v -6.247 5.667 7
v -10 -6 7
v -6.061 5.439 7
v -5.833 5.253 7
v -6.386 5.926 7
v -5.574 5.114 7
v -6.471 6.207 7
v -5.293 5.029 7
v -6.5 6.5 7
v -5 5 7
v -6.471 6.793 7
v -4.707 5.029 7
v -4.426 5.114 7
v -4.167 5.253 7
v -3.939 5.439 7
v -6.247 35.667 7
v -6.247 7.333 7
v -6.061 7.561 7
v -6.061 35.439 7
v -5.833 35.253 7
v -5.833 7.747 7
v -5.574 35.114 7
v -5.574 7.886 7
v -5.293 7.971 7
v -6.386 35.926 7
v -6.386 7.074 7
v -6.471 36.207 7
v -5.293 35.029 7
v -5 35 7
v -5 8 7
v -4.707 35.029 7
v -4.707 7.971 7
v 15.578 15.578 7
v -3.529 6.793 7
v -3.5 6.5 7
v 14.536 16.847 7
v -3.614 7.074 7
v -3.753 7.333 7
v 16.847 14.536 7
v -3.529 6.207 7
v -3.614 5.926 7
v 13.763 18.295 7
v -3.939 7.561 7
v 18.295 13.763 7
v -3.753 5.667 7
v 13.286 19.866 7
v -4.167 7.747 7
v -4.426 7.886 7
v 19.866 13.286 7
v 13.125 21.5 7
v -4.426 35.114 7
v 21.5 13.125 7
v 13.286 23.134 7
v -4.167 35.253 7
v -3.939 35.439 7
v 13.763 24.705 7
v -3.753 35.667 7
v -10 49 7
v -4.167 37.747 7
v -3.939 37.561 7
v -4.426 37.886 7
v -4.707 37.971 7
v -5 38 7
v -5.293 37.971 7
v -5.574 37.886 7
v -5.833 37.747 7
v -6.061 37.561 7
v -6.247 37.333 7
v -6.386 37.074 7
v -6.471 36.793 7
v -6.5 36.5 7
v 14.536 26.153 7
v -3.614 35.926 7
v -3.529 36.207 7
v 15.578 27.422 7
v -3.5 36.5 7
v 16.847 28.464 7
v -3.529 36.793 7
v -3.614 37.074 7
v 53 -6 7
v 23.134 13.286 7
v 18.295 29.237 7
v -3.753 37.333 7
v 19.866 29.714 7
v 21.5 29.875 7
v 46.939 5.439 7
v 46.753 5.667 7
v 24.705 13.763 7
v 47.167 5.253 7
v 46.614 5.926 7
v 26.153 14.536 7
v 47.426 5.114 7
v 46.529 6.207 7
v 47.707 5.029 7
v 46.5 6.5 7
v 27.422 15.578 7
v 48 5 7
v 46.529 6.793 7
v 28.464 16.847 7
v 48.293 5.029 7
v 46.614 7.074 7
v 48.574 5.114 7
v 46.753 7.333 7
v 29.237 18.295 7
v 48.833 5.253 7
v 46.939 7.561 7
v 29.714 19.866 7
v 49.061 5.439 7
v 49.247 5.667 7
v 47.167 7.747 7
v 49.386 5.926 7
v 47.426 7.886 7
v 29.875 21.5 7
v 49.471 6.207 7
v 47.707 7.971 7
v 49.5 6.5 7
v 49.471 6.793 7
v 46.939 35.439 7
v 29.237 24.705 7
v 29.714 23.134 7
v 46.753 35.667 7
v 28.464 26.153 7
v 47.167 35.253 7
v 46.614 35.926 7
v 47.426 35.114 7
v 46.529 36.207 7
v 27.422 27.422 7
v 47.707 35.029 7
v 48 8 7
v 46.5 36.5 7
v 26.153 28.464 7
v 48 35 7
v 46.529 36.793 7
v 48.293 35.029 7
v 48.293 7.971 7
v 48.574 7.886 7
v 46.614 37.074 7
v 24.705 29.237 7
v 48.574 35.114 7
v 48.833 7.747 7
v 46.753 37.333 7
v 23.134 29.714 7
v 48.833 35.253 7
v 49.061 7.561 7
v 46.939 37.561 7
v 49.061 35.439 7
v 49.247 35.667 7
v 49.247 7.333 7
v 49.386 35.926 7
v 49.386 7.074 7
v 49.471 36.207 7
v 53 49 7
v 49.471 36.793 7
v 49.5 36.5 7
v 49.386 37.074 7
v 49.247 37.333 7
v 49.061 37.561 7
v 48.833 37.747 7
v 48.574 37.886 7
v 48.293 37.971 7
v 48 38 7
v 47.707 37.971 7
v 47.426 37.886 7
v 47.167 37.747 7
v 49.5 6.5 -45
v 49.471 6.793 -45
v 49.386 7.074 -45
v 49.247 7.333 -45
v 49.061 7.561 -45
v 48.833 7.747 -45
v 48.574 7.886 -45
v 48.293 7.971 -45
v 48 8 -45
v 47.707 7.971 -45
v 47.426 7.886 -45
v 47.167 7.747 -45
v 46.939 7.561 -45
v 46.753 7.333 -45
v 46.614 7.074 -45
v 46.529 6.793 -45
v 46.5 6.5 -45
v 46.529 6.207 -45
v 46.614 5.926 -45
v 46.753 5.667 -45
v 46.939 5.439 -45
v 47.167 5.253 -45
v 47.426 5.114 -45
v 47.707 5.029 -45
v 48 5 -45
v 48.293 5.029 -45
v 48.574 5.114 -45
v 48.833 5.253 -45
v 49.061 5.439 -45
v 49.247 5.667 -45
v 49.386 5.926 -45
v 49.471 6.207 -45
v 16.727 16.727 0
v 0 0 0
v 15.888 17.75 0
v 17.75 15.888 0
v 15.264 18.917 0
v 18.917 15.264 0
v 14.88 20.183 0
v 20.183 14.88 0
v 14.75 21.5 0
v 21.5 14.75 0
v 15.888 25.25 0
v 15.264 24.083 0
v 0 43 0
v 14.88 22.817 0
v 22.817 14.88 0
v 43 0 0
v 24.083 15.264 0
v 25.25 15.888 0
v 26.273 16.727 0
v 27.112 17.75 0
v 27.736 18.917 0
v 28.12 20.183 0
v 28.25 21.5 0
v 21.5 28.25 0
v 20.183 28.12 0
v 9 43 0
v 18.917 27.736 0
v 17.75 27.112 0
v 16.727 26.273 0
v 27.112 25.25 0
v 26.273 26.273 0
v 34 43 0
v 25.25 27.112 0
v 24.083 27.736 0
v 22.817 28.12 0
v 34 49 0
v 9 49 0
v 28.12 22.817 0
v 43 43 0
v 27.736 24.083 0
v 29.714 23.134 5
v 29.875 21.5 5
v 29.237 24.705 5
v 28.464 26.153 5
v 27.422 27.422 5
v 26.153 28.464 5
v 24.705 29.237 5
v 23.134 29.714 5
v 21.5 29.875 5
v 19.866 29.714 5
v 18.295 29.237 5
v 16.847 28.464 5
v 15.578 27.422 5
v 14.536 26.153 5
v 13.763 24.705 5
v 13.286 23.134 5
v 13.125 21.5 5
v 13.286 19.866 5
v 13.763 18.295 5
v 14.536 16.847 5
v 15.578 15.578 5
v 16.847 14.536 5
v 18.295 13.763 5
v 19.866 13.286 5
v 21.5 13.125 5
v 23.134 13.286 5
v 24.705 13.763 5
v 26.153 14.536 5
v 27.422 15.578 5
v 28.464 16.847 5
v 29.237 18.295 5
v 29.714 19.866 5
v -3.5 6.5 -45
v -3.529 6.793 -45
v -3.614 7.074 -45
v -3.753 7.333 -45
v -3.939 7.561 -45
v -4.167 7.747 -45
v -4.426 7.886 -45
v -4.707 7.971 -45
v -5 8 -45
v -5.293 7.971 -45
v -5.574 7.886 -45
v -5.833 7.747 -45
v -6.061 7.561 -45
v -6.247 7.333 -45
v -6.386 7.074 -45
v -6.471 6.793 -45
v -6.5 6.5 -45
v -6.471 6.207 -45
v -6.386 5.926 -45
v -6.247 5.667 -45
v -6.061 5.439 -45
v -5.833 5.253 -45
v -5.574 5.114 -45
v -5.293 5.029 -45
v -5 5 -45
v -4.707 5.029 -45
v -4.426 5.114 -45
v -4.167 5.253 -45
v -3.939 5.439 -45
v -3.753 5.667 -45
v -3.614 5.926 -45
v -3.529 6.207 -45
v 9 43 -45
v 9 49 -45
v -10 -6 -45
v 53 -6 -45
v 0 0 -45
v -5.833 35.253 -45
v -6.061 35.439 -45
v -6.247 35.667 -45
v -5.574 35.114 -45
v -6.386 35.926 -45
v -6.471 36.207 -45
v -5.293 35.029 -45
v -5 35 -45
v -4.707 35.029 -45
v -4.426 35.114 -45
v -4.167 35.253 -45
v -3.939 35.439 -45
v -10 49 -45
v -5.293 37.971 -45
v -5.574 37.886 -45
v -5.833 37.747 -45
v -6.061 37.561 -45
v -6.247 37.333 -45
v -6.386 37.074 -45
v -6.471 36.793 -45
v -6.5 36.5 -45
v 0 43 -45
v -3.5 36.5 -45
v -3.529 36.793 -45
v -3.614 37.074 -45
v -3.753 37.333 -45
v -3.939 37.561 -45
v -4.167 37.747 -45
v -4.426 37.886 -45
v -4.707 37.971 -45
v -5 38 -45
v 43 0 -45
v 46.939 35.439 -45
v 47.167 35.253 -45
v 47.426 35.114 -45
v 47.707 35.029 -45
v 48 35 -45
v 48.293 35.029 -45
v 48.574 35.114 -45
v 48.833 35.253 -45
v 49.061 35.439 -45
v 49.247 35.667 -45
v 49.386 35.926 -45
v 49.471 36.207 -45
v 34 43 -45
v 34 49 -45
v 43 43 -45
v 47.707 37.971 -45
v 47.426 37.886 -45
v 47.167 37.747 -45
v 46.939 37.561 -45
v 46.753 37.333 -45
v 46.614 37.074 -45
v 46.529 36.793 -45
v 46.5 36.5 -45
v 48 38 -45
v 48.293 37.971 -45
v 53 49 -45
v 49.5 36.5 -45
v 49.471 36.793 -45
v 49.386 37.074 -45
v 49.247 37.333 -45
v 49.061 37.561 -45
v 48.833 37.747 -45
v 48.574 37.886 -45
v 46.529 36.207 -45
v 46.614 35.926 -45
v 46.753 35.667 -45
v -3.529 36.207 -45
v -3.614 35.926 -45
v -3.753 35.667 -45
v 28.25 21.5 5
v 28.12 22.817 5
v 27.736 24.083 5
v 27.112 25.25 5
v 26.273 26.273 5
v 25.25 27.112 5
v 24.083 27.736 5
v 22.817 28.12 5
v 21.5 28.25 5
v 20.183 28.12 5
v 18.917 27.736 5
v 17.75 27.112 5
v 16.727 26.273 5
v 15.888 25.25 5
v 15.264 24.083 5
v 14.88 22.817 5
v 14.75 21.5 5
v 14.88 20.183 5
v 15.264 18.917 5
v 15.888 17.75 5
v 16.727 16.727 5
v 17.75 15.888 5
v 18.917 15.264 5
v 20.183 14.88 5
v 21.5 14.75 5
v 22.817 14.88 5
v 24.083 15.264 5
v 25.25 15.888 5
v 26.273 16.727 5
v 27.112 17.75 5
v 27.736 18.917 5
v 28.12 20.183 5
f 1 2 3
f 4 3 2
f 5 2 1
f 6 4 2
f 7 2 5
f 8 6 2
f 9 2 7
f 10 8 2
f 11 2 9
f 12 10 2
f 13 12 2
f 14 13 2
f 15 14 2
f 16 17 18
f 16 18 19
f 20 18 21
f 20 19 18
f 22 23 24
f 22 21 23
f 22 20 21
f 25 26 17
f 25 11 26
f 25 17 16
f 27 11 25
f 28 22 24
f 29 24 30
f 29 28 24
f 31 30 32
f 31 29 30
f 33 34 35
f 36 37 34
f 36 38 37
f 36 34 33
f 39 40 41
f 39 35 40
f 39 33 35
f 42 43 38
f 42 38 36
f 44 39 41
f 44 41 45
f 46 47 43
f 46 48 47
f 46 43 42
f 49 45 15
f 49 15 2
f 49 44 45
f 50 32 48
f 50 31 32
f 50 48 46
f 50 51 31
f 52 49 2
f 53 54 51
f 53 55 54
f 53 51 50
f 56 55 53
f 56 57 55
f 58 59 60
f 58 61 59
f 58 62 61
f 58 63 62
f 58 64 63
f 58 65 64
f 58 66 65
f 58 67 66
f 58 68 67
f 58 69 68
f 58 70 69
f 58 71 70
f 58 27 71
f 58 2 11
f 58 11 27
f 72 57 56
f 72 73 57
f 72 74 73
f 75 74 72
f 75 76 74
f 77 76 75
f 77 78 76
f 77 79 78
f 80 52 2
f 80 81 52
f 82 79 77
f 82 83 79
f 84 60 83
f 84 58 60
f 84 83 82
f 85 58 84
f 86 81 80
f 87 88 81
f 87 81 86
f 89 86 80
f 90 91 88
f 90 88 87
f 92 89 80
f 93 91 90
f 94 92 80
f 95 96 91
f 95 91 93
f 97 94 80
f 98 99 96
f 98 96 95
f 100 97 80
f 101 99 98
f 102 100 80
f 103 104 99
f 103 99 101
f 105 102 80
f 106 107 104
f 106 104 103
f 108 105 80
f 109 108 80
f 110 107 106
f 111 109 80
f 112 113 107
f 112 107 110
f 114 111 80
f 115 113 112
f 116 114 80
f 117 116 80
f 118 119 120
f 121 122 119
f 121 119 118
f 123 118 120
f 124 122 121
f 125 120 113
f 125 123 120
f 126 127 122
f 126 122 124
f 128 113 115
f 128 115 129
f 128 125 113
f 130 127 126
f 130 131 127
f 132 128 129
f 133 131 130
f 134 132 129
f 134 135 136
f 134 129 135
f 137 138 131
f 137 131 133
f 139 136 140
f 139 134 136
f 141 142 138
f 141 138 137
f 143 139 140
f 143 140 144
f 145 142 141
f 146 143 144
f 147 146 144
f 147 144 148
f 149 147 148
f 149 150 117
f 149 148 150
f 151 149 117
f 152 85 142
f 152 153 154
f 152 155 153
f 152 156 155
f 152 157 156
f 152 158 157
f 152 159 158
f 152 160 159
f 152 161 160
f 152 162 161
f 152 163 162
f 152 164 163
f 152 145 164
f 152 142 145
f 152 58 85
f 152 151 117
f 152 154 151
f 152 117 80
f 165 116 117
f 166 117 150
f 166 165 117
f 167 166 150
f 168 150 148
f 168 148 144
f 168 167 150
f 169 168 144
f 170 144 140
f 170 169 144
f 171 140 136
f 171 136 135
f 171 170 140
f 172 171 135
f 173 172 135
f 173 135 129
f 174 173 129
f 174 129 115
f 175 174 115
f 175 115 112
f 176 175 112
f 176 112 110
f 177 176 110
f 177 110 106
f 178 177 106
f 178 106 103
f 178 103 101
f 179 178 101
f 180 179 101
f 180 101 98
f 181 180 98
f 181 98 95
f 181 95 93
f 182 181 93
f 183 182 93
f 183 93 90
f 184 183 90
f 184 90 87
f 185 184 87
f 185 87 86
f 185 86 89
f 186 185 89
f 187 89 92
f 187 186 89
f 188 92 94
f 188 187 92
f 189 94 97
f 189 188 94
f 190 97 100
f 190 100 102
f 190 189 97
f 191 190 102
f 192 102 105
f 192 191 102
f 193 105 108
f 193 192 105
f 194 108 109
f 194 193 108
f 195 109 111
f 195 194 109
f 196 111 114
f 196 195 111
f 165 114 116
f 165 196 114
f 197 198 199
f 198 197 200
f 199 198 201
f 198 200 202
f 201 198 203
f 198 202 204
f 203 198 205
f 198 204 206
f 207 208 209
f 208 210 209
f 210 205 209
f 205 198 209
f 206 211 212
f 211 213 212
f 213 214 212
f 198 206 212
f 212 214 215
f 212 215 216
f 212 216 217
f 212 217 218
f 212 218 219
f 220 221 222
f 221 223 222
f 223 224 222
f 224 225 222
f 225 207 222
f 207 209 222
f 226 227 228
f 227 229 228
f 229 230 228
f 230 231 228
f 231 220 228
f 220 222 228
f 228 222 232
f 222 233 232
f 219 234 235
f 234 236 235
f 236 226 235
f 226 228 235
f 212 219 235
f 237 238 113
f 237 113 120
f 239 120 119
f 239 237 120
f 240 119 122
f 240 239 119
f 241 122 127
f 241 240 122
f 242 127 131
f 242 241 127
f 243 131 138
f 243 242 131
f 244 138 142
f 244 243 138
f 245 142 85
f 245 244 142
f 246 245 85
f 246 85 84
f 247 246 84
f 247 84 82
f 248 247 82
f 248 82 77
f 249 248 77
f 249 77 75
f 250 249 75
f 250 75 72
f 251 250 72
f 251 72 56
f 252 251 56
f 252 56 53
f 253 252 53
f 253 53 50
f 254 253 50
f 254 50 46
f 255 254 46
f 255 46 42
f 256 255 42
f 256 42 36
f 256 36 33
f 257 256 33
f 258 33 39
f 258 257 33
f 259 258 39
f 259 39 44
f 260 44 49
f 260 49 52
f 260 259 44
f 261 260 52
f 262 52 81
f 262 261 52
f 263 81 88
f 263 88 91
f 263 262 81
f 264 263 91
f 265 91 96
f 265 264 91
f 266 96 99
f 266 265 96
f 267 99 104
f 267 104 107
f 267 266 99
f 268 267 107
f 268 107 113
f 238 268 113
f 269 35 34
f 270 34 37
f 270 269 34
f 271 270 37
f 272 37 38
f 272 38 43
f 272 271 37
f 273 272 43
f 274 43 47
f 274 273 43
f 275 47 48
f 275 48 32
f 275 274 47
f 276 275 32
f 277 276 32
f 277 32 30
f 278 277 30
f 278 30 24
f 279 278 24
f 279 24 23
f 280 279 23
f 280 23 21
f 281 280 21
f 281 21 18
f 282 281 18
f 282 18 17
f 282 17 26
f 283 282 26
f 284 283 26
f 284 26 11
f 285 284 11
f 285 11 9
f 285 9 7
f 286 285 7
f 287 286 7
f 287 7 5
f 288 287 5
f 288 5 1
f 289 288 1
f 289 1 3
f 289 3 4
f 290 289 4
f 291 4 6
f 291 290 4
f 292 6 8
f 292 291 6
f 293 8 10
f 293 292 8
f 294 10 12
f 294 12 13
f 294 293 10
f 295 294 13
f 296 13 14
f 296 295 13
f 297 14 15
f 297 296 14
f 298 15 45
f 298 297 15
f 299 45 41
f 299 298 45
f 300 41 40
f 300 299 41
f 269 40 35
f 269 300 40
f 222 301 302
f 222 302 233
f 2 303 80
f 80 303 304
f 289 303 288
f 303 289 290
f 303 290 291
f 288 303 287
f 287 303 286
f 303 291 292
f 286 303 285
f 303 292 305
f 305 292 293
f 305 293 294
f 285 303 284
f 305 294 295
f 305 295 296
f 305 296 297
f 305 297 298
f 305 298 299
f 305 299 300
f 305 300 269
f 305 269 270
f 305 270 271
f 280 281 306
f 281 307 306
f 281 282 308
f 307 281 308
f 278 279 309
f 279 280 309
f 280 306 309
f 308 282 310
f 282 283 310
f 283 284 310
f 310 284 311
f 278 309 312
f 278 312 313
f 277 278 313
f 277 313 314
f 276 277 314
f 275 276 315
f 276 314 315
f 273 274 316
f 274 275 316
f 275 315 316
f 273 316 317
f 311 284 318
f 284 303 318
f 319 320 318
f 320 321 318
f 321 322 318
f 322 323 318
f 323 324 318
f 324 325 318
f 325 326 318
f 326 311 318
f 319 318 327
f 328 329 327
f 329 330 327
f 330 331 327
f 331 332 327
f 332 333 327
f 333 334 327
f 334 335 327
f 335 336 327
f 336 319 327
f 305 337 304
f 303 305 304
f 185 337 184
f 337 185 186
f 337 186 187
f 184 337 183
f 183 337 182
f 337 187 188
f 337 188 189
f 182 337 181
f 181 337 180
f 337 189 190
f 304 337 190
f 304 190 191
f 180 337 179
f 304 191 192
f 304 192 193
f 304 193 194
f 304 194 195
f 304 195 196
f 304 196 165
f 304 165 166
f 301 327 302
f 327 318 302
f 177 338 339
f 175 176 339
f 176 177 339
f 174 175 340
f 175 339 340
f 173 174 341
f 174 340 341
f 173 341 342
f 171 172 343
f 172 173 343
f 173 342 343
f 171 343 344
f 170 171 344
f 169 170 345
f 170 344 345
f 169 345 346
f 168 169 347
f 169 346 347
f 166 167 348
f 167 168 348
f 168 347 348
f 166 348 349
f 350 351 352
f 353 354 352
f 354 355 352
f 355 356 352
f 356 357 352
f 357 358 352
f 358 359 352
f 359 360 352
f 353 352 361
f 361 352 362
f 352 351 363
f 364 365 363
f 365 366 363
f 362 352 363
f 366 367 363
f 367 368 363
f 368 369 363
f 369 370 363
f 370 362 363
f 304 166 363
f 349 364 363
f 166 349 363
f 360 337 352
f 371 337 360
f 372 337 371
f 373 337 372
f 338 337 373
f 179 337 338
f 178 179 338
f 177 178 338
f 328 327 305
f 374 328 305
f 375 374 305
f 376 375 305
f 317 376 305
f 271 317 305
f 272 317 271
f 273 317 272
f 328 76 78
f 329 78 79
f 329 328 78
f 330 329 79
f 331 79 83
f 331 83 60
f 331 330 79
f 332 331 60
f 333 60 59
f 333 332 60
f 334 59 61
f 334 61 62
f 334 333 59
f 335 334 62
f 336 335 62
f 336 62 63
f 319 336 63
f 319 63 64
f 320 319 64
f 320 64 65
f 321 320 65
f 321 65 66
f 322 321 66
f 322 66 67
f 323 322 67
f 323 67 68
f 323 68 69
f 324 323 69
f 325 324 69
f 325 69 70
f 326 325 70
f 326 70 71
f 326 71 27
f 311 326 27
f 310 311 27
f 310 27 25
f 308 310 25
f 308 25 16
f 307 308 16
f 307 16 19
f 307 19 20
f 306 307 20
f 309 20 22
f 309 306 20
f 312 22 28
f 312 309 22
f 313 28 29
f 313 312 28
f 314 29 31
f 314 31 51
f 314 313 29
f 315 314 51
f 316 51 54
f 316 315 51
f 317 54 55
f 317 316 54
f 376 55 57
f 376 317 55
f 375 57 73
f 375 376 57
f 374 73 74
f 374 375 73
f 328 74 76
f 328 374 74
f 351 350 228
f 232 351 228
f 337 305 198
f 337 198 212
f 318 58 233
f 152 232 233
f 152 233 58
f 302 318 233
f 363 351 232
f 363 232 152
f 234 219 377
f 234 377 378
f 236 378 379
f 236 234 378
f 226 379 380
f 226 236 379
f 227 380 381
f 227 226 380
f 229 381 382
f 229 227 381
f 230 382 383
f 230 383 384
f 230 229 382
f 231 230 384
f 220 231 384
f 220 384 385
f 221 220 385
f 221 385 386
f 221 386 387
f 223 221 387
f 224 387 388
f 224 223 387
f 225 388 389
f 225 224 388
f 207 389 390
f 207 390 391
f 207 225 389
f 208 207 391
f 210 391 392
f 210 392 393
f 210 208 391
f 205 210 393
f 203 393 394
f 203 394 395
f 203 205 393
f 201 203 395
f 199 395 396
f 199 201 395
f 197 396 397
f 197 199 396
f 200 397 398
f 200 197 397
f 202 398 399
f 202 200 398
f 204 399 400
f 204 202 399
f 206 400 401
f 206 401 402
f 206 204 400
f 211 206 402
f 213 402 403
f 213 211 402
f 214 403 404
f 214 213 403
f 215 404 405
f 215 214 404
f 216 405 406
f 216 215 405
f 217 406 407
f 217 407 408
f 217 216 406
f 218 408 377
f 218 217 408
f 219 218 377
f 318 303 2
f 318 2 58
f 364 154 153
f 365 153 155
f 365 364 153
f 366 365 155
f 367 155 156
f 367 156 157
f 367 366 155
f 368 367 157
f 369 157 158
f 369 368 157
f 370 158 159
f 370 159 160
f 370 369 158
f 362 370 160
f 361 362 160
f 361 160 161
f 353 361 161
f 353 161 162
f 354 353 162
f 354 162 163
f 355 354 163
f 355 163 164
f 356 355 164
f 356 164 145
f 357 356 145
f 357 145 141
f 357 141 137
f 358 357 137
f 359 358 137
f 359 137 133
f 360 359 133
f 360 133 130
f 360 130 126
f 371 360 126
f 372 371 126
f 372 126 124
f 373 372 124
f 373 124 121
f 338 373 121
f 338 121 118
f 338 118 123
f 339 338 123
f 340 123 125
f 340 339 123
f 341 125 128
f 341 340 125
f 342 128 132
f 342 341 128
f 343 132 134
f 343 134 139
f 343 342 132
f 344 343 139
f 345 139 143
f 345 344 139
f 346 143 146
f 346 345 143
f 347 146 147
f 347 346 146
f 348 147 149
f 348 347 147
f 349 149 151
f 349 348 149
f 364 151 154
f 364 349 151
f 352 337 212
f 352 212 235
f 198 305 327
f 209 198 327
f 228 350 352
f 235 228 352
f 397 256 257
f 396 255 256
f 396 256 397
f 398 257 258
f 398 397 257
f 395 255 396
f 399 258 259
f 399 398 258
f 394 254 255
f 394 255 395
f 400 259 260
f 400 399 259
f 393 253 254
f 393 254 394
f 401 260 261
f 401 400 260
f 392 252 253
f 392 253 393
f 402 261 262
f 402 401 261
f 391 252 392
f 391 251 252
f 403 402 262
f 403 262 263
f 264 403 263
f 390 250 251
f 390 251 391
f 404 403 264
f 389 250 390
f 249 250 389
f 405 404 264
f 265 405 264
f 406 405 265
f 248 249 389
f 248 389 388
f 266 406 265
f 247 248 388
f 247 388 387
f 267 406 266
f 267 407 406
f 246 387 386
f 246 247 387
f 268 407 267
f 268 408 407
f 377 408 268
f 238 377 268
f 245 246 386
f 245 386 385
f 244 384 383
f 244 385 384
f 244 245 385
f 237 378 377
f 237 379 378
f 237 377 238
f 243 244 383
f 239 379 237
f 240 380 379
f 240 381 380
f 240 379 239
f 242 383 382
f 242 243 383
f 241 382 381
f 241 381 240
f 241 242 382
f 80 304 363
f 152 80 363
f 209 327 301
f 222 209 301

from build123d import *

# Parameters (mm, degrees)
SKETCH1_7_W         = 63
SKETCH1_7_H         = 55
SKETCH1_7_R         = 1.5
SKETCH1_7_R_2       = 8.375
BOSS_EXTRUDE3_DEPTH = 7
BOSS_EXTRUDE4_START = -45
SKETCH1_8_W         = 63
SKETCH1_8_H         = 55
SKETCH1_8_R         = 1.5
SKETCH1_8_W_2       = 43
SKETCH1_8_H_2       = 43
BOSS_EXTRUDE4_DEPTH = 45
SKETCH1_9_R         = 8.375
SKETCH1_9_R_2       = 6.75
BOSS_EXTRUDE5_DEPTH = 5
SKETCH4_W           = 12.5
SKETCH4_H           = 45
CUT_EXTRUDE5_DEPTH  = 6


with BuildPart() as part:
    # Sketch1<7> → Boss-Extrude3 (new body)
    with BuildSketch(Plane.XY):
        with Locations((21.5, 21.5)):
            Rectangle(SKETCH1_7_W, SKETCH1_7_H)
        with Locations((-5, 36.5)):
            Circle(SKETCH1_7_R, mode=Mode.SUBTRACT)
        with Locations((-5, 6.5)):
            Circle(SKETCH1_7_R, mode=Mode.SUBTRACT)
        with Locations((48, 6.5)):
            Circle(SKETCH1_7_R, mode=Mode.SUBTRACT)
        with Locations((48, 36.5)):
            Circle(SKETCH1_7_R, mode=Mode.SUBTRACT)
        with Locations((21.5, 21.5)):
            Circle(SKETCH1_7_R_2, mode=Mode.SUBTRACT)
    extrude(amount=BOSS_EXTRUDE3_DEPTH)

    # Sketch1<8> → Boss-Extrude4 (add)
    with BuildSketch(Plane.XY.offset(BOSS_EXTRUDE4_START)):
        with Locations((21.5, 21.5)):
            Rectangle(SKETCH1_8_W, SKETCH1_8_H)
        with Locations((48, 6.5)):
            Circle(SKETCH1_8_R, mode=Mode.SUBTRACT)
        with Locations((-5, 6.5)):
            Circle(SKETCH1_8_R, mode=Mode.SUBTRACT)
        with Locations((-5, 36.5)):
            Circle(SKETCH1_8_R, mode=Mode.SUBTRACT)
        with Locations((48, 36.5)):
            Circle(SKETCH1_8_R, mode=Mode.SUBTRACT)
        with Locations((21.5, 21.5)):
            Rectangle(SKETCH1_8_W_2, SKETCH1_8_H_2, mode=Mode.SUBTRACT)
    extrude(amount=BOSS_EXTRUDE4_DEPTH)

    # Sketch1<9> → Boss-Extrude5 (add)
    with BuildSketch(Plane.XY):
        with Locations((21.5, 21.5)):
            Circle(SKETCH1_9_R)
        with Locations((21.5, 21.5)):
            Circle(SKETCH1_9_R_2, mode=Mode.SUBTRACT)
    extrude(amount=BOSS_EXTRUDE5_DEPTH)

    # Sketch4 → Cut-Extrude5 (cut)
    with BuildSketch(Plane.XZ.offset(-43)):
        with Locations((27.75, -22.5)):
            Rectangle(SKETCH4_W, SKETCH4_H)
        with Locations((15.25, -22.5)):
            Rectangle(SKETCH4_W, SKETCH4_H)
    extrude(amount=-CUT_EXTRUDE5_DEPTH, mode=Mode.SUBTRACT)


solid = part.part
